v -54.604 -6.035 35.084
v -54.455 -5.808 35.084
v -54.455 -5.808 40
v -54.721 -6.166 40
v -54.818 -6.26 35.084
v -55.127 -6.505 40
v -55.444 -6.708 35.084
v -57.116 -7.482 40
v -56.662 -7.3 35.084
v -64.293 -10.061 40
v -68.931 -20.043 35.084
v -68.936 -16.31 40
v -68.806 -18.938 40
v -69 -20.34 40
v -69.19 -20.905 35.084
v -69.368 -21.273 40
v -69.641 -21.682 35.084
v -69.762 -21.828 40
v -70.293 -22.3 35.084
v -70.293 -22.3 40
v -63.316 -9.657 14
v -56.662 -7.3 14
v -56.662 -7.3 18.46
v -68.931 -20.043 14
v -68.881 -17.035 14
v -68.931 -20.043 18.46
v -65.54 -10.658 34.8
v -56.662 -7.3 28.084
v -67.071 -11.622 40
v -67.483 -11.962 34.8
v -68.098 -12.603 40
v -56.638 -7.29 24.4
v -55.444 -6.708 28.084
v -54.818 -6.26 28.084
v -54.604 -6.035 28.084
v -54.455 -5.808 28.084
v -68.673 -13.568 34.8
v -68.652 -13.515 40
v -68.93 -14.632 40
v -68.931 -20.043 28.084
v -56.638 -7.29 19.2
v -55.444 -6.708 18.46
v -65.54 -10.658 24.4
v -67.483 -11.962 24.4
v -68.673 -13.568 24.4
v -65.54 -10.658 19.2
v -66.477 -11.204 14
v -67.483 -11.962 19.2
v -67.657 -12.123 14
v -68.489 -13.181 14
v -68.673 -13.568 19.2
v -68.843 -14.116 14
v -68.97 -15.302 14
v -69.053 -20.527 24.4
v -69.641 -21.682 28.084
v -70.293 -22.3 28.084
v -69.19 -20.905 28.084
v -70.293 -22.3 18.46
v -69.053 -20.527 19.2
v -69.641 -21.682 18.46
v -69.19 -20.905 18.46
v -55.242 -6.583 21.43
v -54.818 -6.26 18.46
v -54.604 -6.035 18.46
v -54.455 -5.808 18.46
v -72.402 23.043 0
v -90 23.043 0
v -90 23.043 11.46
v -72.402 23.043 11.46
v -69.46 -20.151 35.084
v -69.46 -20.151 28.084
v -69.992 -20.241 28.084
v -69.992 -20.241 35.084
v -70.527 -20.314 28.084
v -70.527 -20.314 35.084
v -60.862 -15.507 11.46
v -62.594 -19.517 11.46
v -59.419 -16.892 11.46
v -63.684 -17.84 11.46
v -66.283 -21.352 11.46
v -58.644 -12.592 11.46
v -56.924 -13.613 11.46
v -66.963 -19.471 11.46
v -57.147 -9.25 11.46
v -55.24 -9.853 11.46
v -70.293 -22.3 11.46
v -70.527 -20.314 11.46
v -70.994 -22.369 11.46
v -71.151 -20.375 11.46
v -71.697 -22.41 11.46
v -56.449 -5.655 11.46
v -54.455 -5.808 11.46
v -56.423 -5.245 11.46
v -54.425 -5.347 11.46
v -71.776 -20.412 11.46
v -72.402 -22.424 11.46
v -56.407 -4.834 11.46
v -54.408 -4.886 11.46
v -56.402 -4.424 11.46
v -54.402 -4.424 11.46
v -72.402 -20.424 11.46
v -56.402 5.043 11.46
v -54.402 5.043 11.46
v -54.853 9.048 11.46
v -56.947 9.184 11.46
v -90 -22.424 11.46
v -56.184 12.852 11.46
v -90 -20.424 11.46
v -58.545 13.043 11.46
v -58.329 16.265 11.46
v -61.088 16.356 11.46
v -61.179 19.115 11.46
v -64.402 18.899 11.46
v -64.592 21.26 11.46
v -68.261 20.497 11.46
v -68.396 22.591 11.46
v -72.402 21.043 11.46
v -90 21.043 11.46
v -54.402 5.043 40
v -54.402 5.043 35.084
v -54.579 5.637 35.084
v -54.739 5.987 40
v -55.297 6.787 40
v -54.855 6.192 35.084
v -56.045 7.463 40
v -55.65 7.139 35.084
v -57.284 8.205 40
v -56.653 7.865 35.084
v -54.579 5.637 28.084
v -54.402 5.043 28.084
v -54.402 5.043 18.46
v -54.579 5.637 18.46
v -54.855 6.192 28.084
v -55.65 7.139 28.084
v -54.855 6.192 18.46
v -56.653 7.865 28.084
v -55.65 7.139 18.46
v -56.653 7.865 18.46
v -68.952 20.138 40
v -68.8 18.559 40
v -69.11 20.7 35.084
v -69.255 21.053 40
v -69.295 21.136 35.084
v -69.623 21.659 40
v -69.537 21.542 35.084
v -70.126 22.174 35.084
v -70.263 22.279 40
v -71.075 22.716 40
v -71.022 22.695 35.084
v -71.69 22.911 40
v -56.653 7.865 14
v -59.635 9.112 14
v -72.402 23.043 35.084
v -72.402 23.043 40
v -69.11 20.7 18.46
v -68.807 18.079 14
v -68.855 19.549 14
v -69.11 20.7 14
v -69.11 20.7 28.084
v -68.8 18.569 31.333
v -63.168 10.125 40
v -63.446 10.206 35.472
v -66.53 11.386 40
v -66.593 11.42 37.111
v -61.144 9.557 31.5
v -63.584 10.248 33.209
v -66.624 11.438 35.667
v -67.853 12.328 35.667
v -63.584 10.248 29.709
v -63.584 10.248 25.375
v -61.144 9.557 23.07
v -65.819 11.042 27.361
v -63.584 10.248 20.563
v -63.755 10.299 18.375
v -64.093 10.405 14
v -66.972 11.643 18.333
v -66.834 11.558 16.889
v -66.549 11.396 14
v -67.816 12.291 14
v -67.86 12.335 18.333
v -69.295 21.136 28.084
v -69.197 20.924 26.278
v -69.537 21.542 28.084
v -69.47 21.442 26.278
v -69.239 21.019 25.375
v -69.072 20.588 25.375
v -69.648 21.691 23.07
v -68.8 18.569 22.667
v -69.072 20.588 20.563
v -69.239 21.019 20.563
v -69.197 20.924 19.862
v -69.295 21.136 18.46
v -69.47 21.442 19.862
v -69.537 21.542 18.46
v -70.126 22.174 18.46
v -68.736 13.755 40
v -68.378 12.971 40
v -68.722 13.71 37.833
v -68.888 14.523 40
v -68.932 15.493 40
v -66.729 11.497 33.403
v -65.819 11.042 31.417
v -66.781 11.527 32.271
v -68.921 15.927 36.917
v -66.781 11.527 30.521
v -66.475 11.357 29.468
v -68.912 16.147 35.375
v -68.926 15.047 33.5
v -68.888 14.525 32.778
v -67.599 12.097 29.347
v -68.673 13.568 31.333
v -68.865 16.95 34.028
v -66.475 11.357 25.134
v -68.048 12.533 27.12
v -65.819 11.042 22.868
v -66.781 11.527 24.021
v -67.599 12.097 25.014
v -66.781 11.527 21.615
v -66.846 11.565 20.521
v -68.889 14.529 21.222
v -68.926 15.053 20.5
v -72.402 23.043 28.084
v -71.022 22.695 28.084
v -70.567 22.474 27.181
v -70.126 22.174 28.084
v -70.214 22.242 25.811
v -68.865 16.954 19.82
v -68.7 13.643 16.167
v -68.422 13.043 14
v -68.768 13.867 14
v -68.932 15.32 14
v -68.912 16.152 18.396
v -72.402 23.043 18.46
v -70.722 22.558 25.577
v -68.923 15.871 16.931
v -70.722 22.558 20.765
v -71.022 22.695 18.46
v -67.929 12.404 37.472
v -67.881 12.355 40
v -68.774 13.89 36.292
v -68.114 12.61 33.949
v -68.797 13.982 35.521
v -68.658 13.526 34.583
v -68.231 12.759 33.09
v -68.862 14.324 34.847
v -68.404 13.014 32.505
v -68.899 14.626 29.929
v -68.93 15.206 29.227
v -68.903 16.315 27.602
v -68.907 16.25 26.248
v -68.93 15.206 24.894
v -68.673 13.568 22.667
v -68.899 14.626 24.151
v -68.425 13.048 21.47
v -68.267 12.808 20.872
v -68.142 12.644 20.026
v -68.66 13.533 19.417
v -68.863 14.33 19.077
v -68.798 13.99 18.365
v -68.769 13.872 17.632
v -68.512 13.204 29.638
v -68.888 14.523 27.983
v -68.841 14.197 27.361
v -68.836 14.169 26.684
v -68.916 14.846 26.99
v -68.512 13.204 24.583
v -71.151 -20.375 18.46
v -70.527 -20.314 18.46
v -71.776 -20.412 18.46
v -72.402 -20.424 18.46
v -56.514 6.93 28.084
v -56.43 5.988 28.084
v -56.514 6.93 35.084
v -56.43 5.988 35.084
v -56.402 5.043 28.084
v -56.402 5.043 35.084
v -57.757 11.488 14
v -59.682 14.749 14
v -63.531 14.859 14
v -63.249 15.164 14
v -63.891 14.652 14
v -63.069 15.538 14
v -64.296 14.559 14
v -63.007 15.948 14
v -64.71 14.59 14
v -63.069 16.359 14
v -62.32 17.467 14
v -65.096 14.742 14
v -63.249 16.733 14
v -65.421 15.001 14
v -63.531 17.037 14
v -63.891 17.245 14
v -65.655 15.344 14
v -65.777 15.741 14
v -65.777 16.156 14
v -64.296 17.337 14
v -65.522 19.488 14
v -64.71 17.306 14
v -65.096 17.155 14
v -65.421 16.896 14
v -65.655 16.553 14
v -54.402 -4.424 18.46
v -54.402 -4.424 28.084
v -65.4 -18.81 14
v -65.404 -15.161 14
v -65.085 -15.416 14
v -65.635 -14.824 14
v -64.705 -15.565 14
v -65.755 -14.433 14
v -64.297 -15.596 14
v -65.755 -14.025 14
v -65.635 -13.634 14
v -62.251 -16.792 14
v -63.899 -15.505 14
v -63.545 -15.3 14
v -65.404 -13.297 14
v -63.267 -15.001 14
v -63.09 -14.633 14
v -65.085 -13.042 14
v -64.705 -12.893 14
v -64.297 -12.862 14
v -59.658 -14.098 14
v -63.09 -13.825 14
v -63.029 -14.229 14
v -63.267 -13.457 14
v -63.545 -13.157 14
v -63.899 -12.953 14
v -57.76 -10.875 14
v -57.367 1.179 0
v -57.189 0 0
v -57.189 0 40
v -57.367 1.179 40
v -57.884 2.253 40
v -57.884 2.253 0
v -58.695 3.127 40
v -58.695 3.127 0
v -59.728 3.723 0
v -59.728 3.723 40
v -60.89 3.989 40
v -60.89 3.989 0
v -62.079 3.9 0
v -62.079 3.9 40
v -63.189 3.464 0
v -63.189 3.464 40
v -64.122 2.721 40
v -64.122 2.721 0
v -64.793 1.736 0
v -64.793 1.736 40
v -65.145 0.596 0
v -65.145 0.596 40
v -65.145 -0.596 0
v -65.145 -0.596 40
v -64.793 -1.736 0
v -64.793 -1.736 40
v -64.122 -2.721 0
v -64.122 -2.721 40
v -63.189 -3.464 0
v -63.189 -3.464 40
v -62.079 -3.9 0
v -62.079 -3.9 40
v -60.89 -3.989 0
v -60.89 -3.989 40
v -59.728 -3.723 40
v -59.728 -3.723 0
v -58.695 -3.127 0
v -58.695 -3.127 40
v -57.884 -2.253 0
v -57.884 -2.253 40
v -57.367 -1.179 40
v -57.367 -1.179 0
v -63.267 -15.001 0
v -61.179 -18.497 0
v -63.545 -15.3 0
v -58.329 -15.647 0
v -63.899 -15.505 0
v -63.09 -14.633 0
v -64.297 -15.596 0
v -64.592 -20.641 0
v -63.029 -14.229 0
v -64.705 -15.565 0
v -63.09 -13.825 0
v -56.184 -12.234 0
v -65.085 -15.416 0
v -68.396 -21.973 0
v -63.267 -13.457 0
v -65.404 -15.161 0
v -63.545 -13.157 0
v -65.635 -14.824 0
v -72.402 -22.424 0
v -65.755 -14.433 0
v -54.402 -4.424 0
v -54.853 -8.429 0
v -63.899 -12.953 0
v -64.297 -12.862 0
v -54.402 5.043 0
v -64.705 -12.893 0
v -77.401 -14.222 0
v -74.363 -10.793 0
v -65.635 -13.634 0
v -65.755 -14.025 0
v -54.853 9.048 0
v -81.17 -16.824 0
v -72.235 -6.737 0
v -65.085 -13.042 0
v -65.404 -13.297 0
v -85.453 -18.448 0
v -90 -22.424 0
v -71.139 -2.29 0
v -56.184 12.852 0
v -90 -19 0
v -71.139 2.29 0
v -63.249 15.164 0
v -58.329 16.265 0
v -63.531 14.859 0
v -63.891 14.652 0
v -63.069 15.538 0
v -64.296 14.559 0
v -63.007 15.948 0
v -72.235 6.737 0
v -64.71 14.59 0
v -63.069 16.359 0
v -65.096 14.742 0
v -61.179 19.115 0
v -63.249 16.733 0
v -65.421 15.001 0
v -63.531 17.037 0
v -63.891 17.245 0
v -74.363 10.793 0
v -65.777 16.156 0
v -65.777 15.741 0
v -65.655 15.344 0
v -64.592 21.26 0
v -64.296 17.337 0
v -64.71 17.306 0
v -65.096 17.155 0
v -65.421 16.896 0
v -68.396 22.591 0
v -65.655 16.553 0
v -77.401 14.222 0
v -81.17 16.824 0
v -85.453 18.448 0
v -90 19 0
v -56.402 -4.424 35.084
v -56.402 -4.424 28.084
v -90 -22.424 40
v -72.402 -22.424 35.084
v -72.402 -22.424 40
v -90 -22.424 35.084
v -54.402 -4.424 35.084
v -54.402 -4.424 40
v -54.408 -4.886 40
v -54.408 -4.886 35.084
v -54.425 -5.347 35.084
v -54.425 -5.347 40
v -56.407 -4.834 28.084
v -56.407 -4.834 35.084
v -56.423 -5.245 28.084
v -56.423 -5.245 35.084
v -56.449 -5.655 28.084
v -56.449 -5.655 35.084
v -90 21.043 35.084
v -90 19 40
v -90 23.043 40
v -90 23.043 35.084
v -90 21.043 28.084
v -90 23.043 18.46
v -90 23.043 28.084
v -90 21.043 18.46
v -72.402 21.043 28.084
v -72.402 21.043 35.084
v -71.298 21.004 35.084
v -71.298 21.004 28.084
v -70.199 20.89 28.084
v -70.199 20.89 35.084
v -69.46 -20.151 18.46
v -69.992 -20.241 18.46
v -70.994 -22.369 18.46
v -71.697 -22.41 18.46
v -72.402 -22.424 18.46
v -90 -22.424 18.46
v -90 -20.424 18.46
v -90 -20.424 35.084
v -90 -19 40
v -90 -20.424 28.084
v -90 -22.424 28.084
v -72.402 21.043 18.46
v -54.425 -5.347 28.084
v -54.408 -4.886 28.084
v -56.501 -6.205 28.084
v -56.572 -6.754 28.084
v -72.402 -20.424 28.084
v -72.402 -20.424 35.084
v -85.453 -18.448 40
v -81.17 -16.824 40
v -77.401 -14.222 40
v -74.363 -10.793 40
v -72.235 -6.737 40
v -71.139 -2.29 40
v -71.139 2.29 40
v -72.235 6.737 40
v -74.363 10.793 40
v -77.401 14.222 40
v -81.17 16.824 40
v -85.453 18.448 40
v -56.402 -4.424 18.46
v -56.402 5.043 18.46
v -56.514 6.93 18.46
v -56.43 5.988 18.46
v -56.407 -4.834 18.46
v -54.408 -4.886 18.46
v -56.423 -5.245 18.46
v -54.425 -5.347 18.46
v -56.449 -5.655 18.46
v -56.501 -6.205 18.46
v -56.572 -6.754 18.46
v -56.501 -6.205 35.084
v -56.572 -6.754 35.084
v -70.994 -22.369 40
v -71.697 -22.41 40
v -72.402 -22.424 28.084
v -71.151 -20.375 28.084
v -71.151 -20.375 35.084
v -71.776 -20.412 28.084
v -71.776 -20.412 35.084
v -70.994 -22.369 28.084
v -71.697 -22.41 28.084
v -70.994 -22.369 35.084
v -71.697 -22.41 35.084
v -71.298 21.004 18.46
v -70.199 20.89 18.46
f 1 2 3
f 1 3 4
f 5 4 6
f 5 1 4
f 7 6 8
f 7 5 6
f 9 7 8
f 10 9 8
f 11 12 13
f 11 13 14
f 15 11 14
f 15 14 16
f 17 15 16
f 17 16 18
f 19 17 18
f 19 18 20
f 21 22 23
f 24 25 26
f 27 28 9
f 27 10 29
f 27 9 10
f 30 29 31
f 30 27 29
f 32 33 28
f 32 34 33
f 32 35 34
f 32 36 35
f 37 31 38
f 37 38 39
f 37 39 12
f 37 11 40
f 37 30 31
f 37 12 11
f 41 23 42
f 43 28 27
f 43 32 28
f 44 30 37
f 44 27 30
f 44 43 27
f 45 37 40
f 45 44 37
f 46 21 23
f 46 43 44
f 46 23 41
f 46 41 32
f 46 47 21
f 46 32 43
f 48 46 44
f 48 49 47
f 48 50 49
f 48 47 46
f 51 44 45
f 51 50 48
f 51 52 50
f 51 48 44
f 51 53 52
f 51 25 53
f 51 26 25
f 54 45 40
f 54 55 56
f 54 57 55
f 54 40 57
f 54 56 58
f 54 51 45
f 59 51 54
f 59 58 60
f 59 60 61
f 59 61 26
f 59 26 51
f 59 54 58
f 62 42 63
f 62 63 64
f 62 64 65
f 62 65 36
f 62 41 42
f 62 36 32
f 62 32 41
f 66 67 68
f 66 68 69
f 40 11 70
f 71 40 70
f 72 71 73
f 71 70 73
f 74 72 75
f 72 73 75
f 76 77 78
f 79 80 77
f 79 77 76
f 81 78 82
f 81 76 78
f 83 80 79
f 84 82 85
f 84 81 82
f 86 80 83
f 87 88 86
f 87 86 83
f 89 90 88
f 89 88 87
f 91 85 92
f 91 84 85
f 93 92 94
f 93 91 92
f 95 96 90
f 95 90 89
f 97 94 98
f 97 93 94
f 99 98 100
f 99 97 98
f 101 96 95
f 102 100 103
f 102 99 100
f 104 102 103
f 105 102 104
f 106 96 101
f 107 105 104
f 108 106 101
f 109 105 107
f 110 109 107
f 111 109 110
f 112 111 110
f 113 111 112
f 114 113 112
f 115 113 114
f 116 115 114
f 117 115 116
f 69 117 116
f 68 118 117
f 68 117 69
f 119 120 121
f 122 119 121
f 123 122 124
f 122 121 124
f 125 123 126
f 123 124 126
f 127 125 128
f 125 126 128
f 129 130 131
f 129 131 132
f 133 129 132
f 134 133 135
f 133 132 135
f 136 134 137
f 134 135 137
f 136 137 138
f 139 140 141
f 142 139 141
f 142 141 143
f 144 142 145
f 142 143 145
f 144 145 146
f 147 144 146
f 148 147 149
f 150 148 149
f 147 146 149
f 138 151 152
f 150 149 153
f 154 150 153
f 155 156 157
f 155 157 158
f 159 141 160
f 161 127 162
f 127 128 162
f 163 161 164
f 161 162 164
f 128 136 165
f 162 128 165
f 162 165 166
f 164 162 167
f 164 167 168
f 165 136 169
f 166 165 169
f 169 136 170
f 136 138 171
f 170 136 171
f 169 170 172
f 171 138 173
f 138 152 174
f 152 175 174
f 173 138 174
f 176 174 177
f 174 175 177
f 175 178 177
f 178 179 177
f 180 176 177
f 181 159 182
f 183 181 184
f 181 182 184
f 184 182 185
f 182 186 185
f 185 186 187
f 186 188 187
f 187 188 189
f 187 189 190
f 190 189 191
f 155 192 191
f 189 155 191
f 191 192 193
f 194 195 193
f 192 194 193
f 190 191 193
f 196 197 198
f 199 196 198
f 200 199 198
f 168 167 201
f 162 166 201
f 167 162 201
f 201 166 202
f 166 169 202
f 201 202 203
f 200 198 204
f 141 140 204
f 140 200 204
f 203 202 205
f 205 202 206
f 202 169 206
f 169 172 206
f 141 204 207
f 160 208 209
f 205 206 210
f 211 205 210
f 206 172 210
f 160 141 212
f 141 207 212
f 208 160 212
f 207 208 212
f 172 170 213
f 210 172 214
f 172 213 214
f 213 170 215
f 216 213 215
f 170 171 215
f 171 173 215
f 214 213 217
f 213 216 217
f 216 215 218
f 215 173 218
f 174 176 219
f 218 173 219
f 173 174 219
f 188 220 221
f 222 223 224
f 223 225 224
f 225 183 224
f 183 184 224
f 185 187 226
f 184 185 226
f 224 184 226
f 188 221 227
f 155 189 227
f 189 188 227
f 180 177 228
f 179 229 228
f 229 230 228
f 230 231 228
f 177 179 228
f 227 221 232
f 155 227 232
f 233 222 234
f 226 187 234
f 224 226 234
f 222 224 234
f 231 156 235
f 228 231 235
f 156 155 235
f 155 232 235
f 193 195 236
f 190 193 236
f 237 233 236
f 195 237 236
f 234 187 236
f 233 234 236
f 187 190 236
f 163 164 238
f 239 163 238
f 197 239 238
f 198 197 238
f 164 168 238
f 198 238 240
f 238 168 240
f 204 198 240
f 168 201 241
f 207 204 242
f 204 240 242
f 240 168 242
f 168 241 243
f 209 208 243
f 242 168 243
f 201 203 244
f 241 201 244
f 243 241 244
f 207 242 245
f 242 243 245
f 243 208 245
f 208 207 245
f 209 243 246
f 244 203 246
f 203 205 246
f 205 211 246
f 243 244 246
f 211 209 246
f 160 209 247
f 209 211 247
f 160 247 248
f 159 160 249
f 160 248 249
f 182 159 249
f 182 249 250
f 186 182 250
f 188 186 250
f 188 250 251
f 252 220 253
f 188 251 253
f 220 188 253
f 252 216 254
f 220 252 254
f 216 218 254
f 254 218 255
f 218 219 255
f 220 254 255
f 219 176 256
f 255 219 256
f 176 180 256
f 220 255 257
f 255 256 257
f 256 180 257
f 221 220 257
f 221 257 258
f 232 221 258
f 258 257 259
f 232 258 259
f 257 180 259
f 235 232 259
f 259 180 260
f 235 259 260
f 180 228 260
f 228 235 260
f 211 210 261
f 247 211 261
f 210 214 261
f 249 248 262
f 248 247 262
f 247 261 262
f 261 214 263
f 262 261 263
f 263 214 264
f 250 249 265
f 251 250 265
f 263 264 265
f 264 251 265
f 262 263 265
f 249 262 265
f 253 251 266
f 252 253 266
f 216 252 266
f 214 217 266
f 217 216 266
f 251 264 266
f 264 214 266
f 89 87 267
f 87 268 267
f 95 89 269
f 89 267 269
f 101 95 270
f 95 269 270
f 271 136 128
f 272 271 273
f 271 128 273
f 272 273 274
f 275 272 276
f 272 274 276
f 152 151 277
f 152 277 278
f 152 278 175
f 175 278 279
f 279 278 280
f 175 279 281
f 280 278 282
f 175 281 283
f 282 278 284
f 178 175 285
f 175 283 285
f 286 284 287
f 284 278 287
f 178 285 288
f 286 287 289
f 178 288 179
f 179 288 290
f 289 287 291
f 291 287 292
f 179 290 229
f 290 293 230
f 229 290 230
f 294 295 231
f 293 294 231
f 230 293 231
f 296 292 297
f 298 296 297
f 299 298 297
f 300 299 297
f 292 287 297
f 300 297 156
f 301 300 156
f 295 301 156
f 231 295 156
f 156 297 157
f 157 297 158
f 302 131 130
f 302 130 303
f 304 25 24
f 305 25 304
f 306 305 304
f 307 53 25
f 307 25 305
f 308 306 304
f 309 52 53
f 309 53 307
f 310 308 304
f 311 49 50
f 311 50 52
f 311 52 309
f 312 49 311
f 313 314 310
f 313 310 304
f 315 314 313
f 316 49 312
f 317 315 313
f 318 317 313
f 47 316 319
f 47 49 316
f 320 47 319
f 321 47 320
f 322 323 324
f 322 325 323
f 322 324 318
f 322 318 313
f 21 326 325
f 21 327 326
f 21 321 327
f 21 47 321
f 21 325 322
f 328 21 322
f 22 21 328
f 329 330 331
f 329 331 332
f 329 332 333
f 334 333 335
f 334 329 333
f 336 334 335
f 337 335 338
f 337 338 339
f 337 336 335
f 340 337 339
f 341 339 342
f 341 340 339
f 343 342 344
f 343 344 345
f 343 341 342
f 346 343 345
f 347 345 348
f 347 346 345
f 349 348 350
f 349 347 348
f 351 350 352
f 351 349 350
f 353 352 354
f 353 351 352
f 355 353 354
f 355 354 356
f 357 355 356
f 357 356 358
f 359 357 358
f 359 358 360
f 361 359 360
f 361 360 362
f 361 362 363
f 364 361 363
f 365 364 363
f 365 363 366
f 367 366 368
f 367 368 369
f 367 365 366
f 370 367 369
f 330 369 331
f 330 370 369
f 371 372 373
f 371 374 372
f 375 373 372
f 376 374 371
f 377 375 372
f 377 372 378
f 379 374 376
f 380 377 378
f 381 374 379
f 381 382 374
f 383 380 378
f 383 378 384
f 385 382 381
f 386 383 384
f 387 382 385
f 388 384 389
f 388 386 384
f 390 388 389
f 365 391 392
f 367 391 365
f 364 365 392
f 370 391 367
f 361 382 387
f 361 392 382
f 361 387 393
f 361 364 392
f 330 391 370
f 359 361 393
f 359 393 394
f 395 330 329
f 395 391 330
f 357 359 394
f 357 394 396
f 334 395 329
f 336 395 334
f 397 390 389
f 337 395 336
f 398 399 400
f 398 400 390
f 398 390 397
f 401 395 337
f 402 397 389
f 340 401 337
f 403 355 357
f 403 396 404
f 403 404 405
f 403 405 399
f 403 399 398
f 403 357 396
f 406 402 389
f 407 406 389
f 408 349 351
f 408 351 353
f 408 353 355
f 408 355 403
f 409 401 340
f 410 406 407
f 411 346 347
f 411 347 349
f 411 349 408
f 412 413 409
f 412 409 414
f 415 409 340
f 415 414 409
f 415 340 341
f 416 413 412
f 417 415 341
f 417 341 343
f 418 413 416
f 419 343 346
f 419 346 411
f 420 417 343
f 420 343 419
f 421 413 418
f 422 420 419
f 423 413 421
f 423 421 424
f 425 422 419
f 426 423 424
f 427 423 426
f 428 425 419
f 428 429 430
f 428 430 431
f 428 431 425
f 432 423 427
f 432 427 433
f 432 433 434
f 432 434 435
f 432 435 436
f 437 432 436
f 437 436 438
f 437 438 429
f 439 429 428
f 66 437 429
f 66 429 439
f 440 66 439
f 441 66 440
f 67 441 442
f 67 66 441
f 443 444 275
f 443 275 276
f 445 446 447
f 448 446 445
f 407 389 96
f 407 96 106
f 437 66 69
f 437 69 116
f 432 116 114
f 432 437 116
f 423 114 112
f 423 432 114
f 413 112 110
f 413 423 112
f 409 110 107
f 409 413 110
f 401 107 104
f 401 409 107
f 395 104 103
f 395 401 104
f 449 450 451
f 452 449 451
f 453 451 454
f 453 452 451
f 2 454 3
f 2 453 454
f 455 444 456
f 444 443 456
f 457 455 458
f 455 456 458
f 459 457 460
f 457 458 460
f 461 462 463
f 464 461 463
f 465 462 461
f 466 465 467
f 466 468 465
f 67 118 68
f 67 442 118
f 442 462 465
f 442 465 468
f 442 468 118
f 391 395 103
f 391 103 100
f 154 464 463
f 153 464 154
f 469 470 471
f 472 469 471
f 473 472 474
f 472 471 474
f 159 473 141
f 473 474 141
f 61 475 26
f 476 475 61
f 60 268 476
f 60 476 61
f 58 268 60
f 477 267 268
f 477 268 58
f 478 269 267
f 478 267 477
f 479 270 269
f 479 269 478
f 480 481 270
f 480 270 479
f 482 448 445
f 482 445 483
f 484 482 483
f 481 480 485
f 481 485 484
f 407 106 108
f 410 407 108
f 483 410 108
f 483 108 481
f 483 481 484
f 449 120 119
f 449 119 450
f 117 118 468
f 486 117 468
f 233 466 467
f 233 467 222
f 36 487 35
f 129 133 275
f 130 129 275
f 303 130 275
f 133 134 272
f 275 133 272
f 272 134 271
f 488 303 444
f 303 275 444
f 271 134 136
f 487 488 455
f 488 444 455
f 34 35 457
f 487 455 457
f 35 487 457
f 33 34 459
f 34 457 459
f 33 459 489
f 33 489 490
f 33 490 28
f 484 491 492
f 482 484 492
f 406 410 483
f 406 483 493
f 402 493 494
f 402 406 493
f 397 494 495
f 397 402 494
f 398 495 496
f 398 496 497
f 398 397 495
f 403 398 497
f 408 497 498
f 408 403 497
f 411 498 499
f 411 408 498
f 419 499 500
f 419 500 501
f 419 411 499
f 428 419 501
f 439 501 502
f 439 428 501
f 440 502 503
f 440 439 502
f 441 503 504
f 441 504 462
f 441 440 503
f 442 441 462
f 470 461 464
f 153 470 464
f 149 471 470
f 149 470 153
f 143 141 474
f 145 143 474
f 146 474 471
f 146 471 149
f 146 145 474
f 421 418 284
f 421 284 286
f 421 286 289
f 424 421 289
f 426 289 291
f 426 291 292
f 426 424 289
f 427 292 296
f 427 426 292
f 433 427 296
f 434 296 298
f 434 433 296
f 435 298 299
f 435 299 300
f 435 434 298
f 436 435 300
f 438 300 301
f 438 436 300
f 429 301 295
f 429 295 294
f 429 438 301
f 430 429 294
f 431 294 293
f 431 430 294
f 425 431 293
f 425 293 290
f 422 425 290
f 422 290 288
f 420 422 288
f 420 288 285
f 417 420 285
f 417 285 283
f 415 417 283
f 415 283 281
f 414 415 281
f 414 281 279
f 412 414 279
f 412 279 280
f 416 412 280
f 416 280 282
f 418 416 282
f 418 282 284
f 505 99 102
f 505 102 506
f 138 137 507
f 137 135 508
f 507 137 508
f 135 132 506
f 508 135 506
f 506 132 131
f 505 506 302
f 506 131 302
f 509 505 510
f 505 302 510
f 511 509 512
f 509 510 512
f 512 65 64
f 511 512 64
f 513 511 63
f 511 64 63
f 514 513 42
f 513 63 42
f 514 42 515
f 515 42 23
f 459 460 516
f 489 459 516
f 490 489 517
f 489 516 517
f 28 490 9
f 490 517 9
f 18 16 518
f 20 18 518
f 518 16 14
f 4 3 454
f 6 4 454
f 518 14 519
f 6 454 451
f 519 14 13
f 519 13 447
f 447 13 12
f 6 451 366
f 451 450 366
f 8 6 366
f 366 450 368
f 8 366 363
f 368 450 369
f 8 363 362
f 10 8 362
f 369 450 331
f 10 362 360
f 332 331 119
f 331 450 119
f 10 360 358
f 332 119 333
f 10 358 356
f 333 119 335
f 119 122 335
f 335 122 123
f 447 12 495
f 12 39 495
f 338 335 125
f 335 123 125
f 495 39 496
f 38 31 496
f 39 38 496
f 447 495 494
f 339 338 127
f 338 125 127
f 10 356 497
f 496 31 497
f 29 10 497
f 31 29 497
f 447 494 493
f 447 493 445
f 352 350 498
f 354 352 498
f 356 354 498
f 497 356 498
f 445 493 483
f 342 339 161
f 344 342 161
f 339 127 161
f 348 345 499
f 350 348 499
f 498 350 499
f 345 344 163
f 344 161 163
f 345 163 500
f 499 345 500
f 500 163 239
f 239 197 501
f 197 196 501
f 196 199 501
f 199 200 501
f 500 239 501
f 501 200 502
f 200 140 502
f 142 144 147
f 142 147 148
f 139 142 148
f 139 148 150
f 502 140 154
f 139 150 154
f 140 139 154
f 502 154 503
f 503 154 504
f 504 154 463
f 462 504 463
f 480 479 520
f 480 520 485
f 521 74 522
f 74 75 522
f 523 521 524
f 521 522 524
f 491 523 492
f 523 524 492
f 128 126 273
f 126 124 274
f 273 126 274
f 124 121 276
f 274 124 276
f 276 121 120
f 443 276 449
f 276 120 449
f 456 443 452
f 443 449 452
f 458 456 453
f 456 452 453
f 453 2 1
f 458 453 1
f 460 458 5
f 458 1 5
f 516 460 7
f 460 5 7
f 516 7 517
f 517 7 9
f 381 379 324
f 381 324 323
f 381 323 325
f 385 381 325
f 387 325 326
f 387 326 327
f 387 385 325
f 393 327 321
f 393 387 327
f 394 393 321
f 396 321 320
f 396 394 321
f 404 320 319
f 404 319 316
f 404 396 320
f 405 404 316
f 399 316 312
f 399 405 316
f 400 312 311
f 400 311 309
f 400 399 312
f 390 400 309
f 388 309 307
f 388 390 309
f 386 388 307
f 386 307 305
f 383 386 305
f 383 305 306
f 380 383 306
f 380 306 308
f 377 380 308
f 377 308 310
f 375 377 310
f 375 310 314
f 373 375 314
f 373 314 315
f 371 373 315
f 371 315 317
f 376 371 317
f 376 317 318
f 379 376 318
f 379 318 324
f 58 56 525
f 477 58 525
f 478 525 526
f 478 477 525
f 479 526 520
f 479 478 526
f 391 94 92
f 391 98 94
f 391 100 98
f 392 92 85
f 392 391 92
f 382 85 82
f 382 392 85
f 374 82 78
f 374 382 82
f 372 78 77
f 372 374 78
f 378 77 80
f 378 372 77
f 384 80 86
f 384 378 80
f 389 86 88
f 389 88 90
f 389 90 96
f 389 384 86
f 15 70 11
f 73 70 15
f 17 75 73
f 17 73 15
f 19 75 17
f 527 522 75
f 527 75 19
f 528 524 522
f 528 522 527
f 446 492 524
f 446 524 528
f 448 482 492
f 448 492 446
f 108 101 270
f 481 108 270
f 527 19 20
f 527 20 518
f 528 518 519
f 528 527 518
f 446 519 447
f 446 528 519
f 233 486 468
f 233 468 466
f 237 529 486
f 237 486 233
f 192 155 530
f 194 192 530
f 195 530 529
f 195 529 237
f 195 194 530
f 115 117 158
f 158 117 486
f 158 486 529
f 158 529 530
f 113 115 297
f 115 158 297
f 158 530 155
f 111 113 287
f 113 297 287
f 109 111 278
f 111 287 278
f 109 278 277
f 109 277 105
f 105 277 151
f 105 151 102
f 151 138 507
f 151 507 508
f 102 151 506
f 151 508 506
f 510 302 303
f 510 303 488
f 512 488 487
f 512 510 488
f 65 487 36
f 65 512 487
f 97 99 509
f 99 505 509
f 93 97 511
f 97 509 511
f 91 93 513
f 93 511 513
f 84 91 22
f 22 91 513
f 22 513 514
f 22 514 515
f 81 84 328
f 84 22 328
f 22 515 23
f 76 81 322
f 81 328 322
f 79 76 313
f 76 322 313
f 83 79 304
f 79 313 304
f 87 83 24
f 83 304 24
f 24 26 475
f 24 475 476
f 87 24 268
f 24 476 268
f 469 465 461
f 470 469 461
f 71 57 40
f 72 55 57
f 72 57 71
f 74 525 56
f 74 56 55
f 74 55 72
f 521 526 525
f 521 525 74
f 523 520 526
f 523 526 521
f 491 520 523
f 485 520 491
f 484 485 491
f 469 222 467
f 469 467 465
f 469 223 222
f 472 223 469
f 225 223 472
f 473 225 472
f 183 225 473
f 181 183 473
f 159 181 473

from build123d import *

# Parameters (mm, degrees)
ESBO_O1_R                = 1.393053459
ESBO_O1_R_2              = 4
ESBO_O1_R_3              = 1.370583382
RESSALTO_EXTRUS_O1_DEPTH = 40
CORTE_EXTRUS_O1_START    = -26
ESBO_O5_R                = 1.393053459
ESBO_O5_R_2              = 1.370583382
CORTE_EXTRUS_O1_DEPTH    = 26
ESBO_O8_W                = 7
ESBO_O8_H                = 2


with BuildPart() as part:
    # Esboço1 → Ressalto-extrusão1 (new body)
    with BuildSketch(Plane.XY):
        with BuildLine():
            Line((-90, -22.423877672), (-90, -19))
            ThreePointArc((-90, -19), (-71, 0), (-90, 19))
            Line((-90, 19), (-90, 23.042521341))
            Line((-90, 23.042521341), (-72.401791427, 23.042521341))
            ThreePointArc((-72.401791427, 23.042521341), (-59.673869366, 17.770443402), (-54.401791427, 5.042521341))
            Line((-54.401791427, 5.042521341), (-54.401791427, -4.423877672))
            ThreePointArc((-54.401791427, -4.423877672), (-59.673869366, -17.151799733), (-72.401791427, -22.423877672))
            Line((-72.401791427, -22.423877672), (-90, -22.423877672))
        make_face()
        with Locations((-64.399704634, 15.948259466)):
            Circle(ESBO_O1_R, mode=Mode.SUBTRACT)
        with Locations((-61.189365531, 0)):
            Circle(ESBO_O1_R_2, mode=Mode.SUBTRACT)
        with Locations((-64.399704634, -14.228928105)):
            Circle(ESBO_O1_R_3, mode=Mode.SUBTRACT)
    extrude(amount=RESSALTO_EXTRUS_O1_DEPTH)

    # Esboço5 → Corte-extrusão1 (cut)
    # profile 1 of 3: a face of its own
    with BuildSketch(Plane.XY.offset(40).offset(CORTE_EXTRUS_O1_START)):
        with BuildLine():
            add(Edge.make_bspline(
                [(-54.401791427, 5.042521341), (-55.530001159, 10.383788665), (-70.453859237, 8.636772089), (-68.317241022, 19.151967947), (-69.419494496, 22.655429754), (-72.401791427, 23.042521341)],
                knots=[0, 0, 0, 0, 0.59841234, 0.778329044, 1, 1, 1, 1], degree=3))
            ThreePointArc((-72.401791427, 23.042521341), (-59.673869366, 17.770443402), (-54.401791427, 5.042521341))
        make_face()
        with Locations((-64.399704634, 15.948259466)):
            Circle(ESBO_O5_R, mode=Mode.SUBTRACT)
    # profile 2 of 3: a face of its own
    with BuildSketch(Plane.XY.offset(40).offset(CORTE_EXTRUS_O1_START)):
        with BuildLine():
            add(Edge.make_bspline(
                [(-54.455116699, -5.808387052), (-55.021642733, -6.906023952), (-60.824639792, -8.65742119), (-69.99744996, -12.030398314), (-68.624992944, -17.552582132), (-68.947451642, -20.712215011), (-69.65151808, -21.847158712), (-70.29295532, -22.299917789)],
                knots=[0.054307943, 0.054307943, 0.054307943, 0.054307943, 0.303140082, 0.59841234, 0.778329044, 0.849345989, 0.932732603, 0.932732603, 0.932732603, 0.932732603], degree=3))
            ThreePointArc((-70.29295532, -22.299917789), (-59.419167454, -16.891895749), (-54.455116699, -5.808387052))
        make_face()
        with Locations((-64.399704634, -14.228928105)):
            Circle(ESBO_O5_R_2, mode=Mode.SUBTRACT)
    # profile 3 of 3: a face of its own
    with BuildSketch(Plane.XY.offset(40).offset(CORTE_EXTRUS_O1_START)):
        with Locations((-64.399704634, 15.948259466)):
            Circle(ESBO_O5_R)
    extrude(amount=CORTE_EXTRUS_O1_DEPTH, mode=Mode.SUBTRACT)

    # Varredura de corte1: sweep along a path in Esboço7
    with BuildLine(Plane.XY.offset(40)) as varredura_de_corte1_path:
        Line((-90, 23.042521341), (-72.401791427, 23.042521341))
        ThreePointArc((-72.401791427, 23.042521341), (-59.673869366, 17.770443402), (-54.401791427, 5.042521341))
        Line((-54.401791427, 5.042521341), (-54.401791427, -4.423877672))
        ThreePointArc((-54.401791427, -4.423877672), (-54.415127686, -5.116645636), (-54.455116699, -5.808387052))
        ThreePointArc((-54.455116699, -5.808387052), (-59.419167454, -16.891895749), (-70.29295532, -22.299917789))
        ThreePointArc((-70.29295532, -22.299917789), (-71.345553317, -22.392860978), (-72.401791427, -22.423877672))
        Line((-72.401791427, -22.423877672), (-90, -22.423877672))
    # Esboço8 → Varredura de corte1 (sweep, cut)
    with BuildSketch(Plane.ZY.offset(90)):
        with Locations((31.583750193, 22.042521341)):
            Rectangle(ESBO_O8_W, ESBO_O8_H)
        with Locations((14.959531016, 22.042521341)):
            Rectangle(ESBO_O8_W, ESBO_O8_H)
    sweep(path=varredura_de_corte1_path.line, mode=Mode.SUBTRACT)


solid = part.part
